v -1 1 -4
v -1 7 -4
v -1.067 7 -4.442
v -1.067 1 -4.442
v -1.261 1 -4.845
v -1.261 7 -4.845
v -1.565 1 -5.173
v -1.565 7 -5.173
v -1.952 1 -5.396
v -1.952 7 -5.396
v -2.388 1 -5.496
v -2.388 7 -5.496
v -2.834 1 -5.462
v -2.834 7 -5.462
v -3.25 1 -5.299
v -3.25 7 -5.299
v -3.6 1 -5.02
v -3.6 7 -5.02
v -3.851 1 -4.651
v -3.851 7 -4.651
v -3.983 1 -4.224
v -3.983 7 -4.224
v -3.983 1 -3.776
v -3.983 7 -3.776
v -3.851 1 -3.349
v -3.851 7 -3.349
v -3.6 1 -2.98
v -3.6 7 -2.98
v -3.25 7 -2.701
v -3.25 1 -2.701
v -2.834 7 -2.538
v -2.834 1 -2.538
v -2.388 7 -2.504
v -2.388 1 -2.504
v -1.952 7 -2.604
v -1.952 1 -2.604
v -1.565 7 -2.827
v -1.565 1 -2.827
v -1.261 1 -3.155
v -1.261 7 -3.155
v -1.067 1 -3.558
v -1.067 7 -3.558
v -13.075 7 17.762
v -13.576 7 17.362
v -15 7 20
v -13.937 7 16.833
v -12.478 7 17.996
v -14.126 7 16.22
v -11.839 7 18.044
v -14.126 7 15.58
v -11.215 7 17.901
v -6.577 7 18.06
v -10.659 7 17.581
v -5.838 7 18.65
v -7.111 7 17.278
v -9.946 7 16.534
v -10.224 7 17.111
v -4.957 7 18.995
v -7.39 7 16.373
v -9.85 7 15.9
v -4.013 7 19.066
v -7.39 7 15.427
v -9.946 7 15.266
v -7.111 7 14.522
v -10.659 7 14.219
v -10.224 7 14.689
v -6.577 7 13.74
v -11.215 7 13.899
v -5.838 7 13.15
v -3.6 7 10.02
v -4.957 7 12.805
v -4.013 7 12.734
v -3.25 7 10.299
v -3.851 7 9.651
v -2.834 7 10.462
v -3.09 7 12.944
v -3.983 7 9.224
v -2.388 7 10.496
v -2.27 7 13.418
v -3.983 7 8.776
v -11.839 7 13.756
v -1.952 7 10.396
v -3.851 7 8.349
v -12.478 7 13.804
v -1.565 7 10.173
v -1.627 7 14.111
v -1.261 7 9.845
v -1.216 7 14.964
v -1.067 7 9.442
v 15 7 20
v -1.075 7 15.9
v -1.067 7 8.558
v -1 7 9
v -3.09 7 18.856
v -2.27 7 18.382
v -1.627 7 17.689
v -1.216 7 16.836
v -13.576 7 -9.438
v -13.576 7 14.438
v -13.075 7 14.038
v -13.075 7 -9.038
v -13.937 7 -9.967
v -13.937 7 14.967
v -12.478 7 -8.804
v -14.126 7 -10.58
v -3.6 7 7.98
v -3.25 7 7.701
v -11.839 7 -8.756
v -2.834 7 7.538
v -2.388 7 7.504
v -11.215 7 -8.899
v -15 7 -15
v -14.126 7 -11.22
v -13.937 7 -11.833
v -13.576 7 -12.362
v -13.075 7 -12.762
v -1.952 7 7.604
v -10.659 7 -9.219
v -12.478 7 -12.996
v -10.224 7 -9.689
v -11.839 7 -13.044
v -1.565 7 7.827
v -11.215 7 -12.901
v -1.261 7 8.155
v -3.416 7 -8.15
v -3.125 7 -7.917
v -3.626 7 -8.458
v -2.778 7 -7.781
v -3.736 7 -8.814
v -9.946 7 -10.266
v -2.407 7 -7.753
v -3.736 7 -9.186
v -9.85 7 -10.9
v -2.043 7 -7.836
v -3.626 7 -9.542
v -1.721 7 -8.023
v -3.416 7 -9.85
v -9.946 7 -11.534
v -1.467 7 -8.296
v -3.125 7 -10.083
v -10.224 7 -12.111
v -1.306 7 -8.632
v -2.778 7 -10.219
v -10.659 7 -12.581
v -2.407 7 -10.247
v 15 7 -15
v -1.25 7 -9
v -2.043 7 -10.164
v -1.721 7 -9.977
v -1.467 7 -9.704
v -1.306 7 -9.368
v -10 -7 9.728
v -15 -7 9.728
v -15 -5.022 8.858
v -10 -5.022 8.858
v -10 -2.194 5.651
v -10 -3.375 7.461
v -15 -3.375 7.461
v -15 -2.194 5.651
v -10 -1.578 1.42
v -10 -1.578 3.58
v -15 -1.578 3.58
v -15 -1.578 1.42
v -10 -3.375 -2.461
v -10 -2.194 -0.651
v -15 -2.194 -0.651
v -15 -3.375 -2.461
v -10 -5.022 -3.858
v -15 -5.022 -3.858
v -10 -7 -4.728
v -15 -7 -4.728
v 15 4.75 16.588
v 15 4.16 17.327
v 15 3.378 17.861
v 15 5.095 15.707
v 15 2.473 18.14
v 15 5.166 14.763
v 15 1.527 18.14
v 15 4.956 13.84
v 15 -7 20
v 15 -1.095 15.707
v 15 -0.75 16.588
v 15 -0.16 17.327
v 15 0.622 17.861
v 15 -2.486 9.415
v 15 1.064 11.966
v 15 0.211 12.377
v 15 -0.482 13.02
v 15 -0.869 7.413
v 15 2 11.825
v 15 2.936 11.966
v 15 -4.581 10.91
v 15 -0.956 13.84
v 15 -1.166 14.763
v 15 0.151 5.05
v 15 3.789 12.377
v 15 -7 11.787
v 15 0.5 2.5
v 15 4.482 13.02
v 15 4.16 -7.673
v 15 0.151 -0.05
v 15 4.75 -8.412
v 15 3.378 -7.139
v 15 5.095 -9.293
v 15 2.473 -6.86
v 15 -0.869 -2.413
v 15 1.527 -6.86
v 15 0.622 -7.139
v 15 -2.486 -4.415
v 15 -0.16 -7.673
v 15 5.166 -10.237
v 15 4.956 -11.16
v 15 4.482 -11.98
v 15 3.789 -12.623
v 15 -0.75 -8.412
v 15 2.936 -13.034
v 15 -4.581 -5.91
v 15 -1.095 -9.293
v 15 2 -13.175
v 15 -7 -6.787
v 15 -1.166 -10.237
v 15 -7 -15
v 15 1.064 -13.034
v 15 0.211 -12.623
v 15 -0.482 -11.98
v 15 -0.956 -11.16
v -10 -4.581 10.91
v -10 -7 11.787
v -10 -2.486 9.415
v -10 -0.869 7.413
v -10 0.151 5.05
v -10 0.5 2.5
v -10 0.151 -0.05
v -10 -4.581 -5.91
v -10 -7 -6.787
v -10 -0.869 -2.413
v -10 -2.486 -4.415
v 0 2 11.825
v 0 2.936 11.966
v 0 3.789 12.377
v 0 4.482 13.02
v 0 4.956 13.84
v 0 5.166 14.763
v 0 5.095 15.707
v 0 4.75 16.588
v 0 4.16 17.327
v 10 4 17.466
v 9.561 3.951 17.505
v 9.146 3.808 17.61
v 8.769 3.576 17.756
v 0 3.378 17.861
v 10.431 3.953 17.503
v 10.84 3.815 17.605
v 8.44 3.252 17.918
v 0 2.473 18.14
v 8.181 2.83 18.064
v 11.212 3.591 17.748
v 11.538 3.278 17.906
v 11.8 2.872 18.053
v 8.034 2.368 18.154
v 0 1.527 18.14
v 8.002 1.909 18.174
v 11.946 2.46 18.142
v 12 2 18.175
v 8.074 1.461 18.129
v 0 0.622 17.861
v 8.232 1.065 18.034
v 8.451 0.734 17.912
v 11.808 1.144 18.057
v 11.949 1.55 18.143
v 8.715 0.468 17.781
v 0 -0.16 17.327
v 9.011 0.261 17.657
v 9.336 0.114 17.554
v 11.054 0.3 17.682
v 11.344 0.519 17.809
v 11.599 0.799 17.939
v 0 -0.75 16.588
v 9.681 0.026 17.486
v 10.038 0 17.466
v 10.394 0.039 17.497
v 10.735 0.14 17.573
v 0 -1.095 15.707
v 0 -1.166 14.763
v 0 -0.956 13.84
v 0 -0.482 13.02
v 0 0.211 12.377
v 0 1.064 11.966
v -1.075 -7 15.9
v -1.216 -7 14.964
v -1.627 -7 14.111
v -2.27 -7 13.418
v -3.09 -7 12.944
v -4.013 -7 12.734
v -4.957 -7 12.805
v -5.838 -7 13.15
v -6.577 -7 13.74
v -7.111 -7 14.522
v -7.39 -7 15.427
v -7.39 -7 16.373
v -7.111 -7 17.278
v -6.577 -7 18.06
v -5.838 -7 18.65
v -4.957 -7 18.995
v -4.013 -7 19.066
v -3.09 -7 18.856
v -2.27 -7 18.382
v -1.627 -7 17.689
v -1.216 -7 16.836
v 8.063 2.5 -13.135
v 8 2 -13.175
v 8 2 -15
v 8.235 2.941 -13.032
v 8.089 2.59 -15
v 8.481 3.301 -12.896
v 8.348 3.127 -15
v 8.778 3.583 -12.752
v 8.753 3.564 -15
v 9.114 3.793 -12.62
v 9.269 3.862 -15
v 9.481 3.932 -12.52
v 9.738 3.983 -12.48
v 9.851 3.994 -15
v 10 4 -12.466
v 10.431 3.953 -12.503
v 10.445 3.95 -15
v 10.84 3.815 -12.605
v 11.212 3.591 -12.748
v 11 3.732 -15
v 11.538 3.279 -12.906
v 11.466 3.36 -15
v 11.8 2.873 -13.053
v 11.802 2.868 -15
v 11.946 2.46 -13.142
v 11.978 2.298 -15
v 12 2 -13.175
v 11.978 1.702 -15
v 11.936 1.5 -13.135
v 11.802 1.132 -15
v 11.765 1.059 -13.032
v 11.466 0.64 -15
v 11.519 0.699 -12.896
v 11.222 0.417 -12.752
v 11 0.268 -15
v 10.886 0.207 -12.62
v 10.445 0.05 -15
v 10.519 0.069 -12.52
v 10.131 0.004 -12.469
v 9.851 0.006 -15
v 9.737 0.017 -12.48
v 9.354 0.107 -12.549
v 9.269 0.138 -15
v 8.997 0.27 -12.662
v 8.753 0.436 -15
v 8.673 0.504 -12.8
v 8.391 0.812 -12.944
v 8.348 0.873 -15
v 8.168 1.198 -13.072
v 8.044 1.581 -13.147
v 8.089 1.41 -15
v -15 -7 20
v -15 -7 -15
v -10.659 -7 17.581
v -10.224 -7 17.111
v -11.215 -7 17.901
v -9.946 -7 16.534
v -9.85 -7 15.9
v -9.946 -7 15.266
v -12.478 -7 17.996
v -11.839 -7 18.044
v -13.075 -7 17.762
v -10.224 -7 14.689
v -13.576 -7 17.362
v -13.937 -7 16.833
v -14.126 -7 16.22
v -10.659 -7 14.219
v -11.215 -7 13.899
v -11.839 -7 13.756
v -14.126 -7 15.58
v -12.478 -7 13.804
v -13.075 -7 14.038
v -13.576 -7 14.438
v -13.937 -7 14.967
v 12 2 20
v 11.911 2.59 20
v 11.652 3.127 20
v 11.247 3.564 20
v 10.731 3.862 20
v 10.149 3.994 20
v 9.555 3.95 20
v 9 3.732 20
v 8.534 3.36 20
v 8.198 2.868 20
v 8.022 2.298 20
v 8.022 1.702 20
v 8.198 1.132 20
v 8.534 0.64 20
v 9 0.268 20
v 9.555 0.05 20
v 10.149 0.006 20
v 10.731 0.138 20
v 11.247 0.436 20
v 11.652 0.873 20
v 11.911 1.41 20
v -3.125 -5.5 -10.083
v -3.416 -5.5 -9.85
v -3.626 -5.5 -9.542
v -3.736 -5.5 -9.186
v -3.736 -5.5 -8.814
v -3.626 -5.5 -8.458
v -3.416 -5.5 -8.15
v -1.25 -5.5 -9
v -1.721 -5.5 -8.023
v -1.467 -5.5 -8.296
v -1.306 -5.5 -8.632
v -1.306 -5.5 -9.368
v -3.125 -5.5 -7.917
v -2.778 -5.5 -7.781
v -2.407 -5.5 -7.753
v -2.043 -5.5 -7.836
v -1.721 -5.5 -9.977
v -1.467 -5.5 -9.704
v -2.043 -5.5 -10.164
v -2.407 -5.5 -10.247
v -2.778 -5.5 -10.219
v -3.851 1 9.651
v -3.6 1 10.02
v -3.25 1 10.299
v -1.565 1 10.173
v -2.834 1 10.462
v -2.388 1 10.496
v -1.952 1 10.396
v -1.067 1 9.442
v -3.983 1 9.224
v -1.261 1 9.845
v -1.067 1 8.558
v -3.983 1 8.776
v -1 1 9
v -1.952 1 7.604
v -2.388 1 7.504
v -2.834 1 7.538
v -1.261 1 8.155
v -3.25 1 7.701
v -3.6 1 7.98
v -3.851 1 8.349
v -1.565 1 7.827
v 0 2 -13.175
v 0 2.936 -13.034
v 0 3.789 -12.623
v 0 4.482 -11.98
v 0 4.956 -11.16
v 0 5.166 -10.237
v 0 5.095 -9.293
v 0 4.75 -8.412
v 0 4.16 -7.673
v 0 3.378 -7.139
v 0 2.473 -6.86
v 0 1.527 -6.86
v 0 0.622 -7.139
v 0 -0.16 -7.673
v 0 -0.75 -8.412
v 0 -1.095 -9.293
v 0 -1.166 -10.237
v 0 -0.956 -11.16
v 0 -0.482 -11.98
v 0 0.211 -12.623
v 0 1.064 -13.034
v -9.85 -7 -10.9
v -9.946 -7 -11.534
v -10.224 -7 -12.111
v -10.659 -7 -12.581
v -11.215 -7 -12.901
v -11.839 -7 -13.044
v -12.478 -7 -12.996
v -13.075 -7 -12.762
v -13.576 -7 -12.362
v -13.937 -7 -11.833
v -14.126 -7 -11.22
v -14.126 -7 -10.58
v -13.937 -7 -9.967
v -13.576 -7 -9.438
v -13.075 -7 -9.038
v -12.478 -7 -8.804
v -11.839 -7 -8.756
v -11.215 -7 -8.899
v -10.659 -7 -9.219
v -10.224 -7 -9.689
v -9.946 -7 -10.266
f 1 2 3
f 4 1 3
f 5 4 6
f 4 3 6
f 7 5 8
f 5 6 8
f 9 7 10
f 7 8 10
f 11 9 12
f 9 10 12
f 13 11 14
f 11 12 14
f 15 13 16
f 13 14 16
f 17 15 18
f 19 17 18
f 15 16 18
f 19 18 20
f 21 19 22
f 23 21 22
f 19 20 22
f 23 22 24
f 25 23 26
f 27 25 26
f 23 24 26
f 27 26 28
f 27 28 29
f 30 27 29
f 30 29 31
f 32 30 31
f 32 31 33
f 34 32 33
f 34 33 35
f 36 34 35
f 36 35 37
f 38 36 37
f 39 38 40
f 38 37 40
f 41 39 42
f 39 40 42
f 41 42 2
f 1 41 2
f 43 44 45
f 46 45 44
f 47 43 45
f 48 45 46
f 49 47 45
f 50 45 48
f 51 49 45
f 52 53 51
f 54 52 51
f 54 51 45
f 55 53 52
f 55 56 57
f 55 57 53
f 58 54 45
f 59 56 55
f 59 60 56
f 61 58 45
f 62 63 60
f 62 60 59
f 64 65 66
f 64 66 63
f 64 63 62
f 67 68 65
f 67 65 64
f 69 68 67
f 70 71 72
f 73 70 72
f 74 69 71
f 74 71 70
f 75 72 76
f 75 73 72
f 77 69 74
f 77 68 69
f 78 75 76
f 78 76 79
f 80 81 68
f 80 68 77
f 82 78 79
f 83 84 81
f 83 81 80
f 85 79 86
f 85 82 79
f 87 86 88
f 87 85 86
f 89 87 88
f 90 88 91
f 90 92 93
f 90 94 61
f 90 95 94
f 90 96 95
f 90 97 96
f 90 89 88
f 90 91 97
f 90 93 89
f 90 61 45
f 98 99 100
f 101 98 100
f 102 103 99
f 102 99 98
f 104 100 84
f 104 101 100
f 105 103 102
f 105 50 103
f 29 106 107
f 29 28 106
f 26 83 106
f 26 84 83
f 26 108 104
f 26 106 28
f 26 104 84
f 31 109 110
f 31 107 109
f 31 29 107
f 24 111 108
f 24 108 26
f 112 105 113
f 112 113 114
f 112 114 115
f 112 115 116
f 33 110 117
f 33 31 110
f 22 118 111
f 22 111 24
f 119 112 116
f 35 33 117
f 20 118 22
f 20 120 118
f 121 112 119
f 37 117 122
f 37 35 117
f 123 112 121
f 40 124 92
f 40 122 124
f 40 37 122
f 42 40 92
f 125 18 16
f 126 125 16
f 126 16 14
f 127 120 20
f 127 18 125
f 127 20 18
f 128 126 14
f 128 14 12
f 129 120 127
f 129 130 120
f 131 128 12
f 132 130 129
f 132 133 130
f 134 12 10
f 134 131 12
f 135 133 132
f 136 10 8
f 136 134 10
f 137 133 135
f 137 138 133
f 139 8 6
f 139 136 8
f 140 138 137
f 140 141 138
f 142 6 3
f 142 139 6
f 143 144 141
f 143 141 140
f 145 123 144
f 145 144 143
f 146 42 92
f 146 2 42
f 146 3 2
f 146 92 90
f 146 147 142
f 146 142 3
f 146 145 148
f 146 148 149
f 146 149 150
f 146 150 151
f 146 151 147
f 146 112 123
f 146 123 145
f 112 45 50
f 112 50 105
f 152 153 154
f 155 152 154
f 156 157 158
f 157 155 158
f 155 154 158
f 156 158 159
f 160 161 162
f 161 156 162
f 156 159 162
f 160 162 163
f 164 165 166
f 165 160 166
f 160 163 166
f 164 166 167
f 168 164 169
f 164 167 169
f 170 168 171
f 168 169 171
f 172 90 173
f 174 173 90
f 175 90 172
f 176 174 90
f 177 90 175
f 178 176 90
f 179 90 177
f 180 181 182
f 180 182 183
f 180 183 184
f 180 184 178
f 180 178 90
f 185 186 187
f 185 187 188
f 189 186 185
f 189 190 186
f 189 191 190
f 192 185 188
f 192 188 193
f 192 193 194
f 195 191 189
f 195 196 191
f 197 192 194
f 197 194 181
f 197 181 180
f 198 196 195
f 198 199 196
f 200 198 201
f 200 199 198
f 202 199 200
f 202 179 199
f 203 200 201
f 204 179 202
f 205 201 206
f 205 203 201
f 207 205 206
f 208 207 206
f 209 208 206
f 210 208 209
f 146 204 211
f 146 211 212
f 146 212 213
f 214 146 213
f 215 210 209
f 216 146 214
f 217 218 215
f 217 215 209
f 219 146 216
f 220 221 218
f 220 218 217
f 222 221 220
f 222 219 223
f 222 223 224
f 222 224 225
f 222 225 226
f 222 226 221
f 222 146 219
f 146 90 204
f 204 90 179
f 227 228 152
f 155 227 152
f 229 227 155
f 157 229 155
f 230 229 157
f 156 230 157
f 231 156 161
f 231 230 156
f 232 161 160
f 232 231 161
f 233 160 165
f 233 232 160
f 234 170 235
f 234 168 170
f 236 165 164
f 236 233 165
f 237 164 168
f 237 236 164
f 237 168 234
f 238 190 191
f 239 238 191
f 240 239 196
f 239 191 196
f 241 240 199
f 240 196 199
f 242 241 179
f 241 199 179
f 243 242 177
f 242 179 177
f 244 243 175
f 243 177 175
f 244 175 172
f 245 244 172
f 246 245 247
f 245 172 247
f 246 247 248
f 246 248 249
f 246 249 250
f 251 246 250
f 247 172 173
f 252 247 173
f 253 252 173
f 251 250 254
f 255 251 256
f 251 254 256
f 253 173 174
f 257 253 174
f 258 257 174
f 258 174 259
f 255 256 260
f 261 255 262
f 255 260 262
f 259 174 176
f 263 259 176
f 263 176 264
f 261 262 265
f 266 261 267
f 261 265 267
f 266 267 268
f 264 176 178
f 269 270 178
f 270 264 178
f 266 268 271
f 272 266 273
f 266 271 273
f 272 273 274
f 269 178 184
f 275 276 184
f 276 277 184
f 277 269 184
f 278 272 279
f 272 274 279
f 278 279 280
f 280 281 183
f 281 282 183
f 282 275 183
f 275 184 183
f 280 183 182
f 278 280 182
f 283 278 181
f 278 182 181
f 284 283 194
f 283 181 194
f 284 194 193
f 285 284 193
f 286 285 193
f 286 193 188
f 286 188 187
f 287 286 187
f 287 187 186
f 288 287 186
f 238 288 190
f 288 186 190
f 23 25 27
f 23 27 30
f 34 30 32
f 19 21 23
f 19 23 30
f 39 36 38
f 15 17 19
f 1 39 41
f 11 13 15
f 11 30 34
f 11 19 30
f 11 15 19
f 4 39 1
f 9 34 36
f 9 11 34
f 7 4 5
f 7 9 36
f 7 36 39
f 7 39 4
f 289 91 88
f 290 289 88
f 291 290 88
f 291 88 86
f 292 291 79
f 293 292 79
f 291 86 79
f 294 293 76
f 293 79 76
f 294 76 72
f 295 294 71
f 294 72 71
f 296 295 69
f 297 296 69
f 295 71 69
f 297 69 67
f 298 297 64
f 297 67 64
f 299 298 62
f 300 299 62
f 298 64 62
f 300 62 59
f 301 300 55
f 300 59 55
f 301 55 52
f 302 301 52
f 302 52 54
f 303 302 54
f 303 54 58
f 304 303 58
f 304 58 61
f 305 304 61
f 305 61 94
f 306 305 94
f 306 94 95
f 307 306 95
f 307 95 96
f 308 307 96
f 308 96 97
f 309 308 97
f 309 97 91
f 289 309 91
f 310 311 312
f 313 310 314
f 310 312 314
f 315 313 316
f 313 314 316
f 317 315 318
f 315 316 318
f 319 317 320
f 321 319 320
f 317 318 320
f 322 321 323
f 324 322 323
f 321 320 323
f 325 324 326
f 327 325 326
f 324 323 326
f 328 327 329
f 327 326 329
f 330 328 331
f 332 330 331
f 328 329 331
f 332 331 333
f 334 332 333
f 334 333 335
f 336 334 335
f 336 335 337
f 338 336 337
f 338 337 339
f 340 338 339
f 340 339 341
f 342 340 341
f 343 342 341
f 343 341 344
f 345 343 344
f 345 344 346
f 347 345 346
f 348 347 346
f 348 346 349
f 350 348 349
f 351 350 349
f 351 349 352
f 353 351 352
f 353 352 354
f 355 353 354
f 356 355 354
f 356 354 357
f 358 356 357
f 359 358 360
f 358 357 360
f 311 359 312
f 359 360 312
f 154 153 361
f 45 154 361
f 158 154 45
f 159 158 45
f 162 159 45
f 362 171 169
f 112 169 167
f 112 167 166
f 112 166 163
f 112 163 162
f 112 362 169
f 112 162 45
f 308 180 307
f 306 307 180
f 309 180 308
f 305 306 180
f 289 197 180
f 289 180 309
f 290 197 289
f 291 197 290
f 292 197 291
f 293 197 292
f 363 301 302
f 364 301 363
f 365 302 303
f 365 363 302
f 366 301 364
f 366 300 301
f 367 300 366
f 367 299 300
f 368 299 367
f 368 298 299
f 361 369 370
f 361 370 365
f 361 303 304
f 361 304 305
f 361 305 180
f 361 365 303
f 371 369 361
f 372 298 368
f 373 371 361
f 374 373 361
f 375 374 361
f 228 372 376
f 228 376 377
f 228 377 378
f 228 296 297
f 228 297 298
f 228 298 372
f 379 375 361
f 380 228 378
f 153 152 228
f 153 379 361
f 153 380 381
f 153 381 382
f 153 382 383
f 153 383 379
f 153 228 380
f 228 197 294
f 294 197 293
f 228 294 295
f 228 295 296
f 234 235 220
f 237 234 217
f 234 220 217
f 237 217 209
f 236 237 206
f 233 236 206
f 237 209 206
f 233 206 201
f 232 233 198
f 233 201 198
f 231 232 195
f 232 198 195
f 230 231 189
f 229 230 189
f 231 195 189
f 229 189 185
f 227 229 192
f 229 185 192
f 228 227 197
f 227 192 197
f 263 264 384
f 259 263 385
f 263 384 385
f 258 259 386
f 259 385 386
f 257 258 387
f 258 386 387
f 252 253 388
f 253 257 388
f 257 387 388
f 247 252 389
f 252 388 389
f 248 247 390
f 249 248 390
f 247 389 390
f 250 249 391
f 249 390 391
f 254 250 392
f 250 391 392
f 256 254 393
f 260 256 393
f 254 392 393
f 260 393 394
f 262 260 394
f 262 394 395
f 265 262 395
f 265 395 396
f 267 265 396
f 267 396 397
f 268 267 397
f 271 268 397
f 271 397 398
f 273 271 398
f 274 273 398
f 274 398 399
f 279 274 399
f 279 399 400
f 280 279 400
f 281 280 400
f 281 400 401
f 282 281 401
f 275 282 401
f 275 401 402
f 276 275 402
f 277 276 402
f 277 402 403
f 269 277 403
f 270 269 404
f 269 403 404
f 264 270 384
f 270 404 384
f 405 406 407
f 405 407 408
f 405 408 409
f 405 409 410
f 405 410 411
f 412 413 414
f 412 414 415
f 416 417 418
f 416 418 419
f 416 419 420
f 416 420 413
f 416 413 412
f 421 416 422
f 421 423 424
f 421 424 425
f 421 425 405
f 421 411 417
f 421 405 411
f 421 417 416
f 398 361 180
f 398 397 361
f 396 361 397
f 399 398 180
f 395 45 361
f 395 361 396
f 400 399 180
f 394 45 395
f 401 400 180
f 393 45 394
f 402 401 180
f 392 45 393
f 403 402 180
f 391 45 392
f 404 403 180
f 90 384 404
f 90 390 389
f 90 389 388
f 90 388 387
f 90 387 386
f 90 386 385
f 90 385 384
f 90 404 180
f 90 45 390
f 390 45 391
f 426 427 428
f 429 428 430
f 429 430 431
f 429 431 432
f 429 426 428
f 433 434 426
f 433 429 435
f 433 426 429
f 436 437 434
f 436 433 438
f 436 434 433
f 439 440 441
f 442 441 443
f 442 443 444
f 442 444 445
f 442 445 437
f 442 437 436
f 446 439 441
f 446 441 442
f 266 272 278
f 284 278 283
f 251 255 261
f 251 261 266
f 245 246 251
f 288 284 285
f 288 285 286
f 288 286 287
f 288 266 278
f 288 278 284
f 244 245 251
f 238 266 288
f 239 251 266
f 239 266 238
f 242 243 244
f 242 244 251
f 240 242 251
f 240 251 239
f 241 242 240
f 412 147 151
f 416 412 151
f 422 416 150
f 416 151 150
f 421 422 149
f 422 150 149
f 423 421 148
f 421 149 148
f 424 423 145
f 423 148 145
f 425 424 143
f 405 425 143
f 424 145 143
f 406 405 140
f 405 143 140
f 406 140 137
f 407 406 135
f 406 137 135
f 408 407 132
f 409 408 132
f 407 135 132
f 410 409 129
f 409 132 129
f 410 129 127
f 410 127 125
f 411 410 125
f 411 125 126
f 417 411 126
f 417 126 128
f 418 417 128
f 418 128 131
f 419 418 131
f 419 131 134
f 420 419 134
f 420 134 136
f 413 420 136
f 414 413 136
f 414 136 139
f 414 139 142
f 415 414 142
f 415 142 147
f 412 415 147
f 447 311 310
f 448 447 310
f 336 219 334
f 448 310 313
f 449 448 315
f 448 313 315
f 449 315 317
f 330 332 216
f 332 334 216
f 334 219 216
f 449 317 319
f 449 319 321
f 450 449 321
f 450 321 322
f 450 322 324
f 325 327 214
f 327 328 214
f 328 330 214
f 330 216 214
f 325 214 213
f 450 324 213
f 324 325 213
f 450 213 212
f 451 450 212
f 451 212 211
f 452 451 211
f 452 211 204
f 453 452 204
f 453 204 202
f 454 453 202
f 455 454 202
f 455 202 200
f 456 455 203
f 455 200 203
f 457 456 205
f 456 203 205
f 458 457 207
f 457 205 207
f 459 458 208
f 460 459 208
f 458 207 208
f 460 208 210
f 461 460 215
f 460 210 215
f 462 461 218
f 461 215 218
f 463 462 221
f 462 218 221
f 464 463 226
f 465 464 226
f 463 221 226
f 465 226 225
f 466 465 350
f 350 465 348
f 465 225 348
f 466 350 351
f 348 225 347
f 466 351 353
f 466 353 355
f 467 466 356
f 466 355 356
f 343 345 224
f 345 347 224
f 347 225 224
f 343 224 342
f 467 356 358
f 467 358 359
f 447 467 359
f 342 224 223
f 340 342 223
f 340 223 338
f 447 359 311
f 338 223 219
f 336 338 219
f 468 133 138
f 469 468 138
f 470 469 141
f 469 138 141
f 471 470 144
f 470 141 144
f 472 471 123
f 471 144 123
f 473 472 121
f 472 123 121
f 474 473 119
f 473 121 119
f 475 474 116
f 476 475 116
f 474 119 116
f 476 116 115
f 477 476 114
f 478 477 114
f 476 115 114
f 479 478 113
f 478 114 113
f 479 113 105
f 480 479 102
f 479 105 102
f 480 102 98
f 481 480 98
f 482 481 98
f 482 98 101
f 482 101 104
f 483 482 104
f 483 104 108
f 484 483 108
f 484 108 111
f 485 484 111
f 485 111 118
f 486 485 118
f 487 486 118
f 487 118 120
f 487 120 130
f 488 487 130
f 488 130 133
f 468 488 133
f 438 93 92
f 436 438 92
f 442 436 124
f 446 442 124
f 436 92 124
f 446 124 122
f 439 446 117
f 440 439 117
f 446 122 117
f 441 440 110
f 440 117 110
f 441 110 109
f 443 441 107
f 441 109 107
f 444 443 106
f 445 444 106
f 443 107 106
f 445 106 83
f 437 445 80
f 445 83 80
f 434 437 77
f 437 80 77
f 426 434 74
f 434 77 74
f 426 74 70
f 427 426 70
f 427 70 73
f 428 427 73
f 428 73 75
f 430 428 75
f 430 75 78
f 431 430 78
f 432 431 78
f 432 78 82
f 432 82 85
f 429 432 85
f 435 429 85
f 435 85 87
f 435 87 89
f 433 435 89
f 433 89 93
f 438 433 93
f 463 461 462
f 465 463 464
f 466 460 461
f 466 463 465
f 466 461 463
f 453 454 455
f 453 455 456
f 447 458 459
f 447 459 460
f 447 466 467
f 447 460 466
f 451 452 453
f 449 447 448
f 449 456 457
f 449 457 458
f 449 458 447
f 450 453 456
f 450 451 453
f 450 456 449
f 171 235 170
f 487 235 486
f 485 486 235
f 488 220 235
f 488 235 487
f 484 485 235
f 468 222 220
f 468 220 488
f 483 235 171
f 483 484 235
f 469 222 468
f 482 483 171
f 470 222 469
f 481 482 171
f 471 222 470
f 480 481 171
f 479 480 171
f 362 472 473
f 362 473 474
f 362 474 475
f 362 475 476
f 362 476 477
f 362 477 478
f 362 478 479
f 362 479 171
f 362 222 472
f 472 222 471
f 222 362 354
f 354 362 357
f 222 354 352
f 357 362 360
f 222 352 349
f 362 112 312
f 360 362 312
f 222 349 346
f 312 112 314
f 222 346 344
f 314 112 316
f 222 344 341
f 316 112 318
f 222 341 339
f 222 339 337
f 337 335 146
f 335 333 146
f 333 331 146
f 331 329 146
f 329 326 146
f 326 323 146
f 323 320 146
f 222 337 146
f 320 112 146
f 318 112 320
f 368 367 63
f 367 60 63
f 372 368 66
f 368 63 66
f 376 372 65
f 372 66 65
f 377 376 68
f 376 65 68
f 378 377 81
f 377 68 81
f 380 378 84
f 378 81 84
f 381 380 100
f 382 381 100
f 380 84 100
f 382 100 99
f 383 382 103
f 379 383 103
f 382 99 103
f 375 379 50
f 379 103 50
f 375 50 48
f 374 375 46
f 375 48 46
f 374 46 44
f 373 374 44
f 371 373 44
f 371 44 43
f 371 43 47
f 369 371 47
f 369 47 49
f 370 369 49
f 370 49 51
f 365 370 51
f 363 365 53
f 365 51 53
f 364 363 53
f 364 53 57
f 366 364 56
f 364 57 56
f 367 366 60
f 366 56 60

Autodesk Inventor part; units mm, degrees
ref_plane "YZ Plane" through (0, 0, 0) normal (1, 0, 0) x (0, 1, 0)
ref_plane "XZ Plane" through (0, 0, 0) normal (0, 1, 0) x (-1, 0, 0)
ref_plane "XY Plane" through (0, 0, 0) normal (0, 0, 1) x (1, 0, 0)
sketch "Sketch1" plane through (0, 0, 0) normal (0, 0, 1) x (1, 0, 0)
  line L0 (15, -7) -> (-15, -7)
  line L1 (-15, -7) -> (-15, 7)
  line L2 (-15, 7) -> (15, 7)
  line L3 (15, 7) -> (15, -7)
  line L4 (15, -7) -> (-15, 7) construction
  line L5 (-15, -7) -> (15, 7) construction
  point P0 (0, 0)
  dimension "d0" = 30
  dimension "d1" = 14
extrude "Extrusion1" add sketch "Sketch1" along normal blind 35
sketch "Sketch3" plane through (15, -7, 0) normal (1, 0, 0) x (0, 0, -1)
  line L0 (0, 0) -> (-35, 0) projected
  line L1 (-17.5, 0) -> (-17.5, -2)
  arc A0 (-8.2129, 0) -> (-26.7871, 0) centre (-17.5, -2) ccw
  point P0 (0, 7)
  dimension "d4" = 2
  dimension "d5" = 19
extrude "Extrusion2" cut sketch "Sketch3" against normal blind 25
sketch "Sketch5" plane through (-15, 7, 0) normal (0, 1, 0) x (1, 0, 0)
  line L0 (30, 0) -> (0, 0) projected
  line L1 (30, -35) -> (0, -35) projected
  line L2 (0, -35) -> (0, -30.9)
  line L3 (0, 0) -> (0, -35) projected
  line L4 (0, -30.9) -> (2.75, -30.9)
  circle A0 centre (2.75, -30.9) radius 2
  line L5 (0, 0) -> (0, -4.1)
  line L6 (0, -4.1) -> (2.75, -4.1)
  circle A1 centre (2.75, -4.1) radius 2
  line L7 (2.75, -30.9) -> (10.75, -30.9)
  circle A2 centre (10.75, -30.9) radius 3.175
  point P0 (15, 0)
  dimension "d11" = 4.1
  dimension "d12" = 2.75
  dimension "d13" = 4
  dimension "d14" = 4.1
  dimension "d15" = 2.75
  dimension "d16" = 4
  dimension "d17" = 8
  dimension "d18" = 6.35
extrude "Extrusion3" cut sketch "Sketch5" against normal blind 100 contours A2
sketch "Sketch6" plane through (-15, 7, 0) normal (0, 1, 0) x (1, 0, 0)
  point P0 (15, 0)
sketch "Sketch7" plane through (15, -7, 0) normal (1, 0, 0) x (0, 0, -1)
  line L0 (0, 14) -> (-35, 14) projected
  line L1 (-35, 14) -> (-30, 14)
  line L2 (-30, 14) -> (-30, 9)
  line L3 (0, 14) -> (0, 0) projected
  line L4 (0, 14) -> (-5, 14)
  line L5 (-5, 14) -> (-5, 9)
  circle A0 centre (-30, 9) radius 3.175
  circle A1 centre (-5, 9) radius 3.175
  point P0 (0, 7)
  dimension "d21" = 5
  dimension "d22" = 5
  dimension "d23" = 5
  dimension "d24" = 5
  dimension "d25" = 6.35
  dimension "d26" = 6.35
extrude "Extrusion4" cut sketch "Sketch7" against normal blind 15
move or copy body "Move Body1" bodies to move or copy 1 copy no translate (-20, 0, 0)
move or copy body "Move Body2" bodies to move or copy 1 copy no translate (-5, 0, 0)
sketch "Sketch8" plane through (0, 0, 0) normal (1, 0, 0) x (0, 1, 0)
  point P0 (0, 0)
sketch "Sketch9" plane through (-40, 7, 0) normal (0, 1, 0) x (1, 0, 0)
  line L0 (30, -35) -> (0, -35) projected
  line L1 (0, -35) -> (0, -30.9)
  line L2 (0, 0) -> (0, -35) projected
  line L3 (0, -30.9) -> (3, -30.9)
  circle A0 centre (3, -30.9) radius 2.15
  line L4 (0, 0) -> (0, -4.1)
  line L5 (0, -4.1) -> (3, -4.1)
  circle A1 centre (3, -4.1) radius 2.15
  point P0 (40, 0)
  dimension "d35" = 4.1
  dimension "d36" = 3
  dimension "d37" = 4.3
  dimension "d38" = 4.1
  dimension "d39" = 4.3
  dimension "d40" = 3
extrude "Extrusion5" cut sketch "Sketch9" against normal blind 14
sketch "Sketch14" plane through (-40, 7, 35) normal (0, 0, 1) x (1, 0, 0)
  line L0 (30, 0) -> (0, 0) projected
  line L1 (30, 0) -> (25, 0)
  line L2 (25, 0) -> (25, -5)
  circle A0 centre (25, -5) radius 2
  point P0 (40, -7)
  dimension "d47" = 5
  dimension "d48" = 5
  dimension "d49" = 4
extrude "Extrusion6" cut sketch "Sketch14" against normal blind 3
sketch "Sketch15" plane through (-10, 7, 0) normal (0, 0, -1) x (-1, 0, 0)
  line L0 (0, -14) -> (0, 0) projected
  line L1 (0, 0) -> (5, 0)
  line L2 (0, 0) -> (30, 0) projected
  line L3 (5, 0) -> (5, -5)
  circle A0 centre (5, -5) radius 2
  point P0 (-10, -7)
  dimension "d52" = 5
  dimension "d53" = 5
  dimension "d54" = 4
extrude "Extrusion7" cut sketch "Sketch15" against normal blind 4
thread "Thread3" size "M4x0.7" class "6H" standard "ANSI Metric M Profile" full length
thread "Thread4" size "M4x0.7" class "6H" standard "ANSI Metric M Profile" full length
sketch "Sketch16" plane through (-40, -7, 0) normal (-1, 0, 0) x (0, 0, 1)
  line L0 (0, 14) -> (35, 14) projected
  line L1 (0, 14) -> (17.5, 14)
  line L2 (17.5, 14) -> (17.5, -2)
  circle A0 centre (17.5, -2) radius 7.5
  point P0 (0, 7)
  dimension "d61" = 16
  dimension "d62" = 15
extrude "Extrusion8" cut sketch "Sketch16" against normal blind 15
move or copy body "Move Body3" bodies to move or copy 1 copy no translate (25, 0, 0)
move or copy body "Move Body4" bodies to move or copy 1 copy no translate (10, 0, -15)
move or copy body "Move Body5" bodies to move or copy 1 copy no translate (-10, 0, 0)
sketch "Sketch17" plane through (15, -7, -15) normal (1, 0, 0) x (0, 0, -1)
  point P0 (-15, 7)
sketch "Sketch19" plane through (-15, 7, -15) normal (0, 1, 0) x (1, 0, 0)
  line L0 (30, 0) -> (0, 0) projected
  line L1 (0, 0) -> (0, -6)
  line L2 (0, 0) -> (6, 0) construction
  line L3 (0, -6) -> (12.5, -6)
  circle A0 centre (12.5, -6) radius 1.25
  line L4 (12.5, -6) -> (12.5, -8.5)
  line L5 (12.5, -6) -> (15, -6) construction
  point P0 (15, -15)
  dimension "d74" = 6
  dimension "d75" = 90
  dimension "d76" = 12.5
  dimension "d77" = 90
  dimension "d78" = 2.5
  dimension "d84" = 2.5
  dimension "d85" = 90
extrude "Extrusion9" cut sketch "Sketch19" against normal blind 12.5
sketch "Sketch20" plane through (-15, 7, -15) normal (0, 1, 0) x (1, 0, 0)
  circle A0 centre (12.5, -6) radius 1.25 projected
  line L0 (12.5, -6) -> (12.5, -11)
  circle A1 centre (12.5, -11) radius 1.5
  line L1 (30, 0) -> (0, 0) projected
  line L2 (12.5, -11) -> (25.5, -11) construction
  line L3 (0, 0) -> (0, -35) projected
  line L4 (0, -17.5) -> (30, -17.5)
  line L5 (30, -8.2129) -> (30, -26.7871) projected
  circle A2 centre (12.5, -24) radius 1.5
  point P0 (15, -15)
  dimension "d86" = 5
  dimension "d87" = 3
extrude "Extrusion10" cut sketch "Sketch20" against normal blind 6 contours A1 | A2
thread "Thread5" size "M3x0.5" class "6H" standard "ANSI Metric M Profile" full length
thread "Thread6" size "M3x0.5" class "6H" standard "ANSI Metric M Profile" full length
equation "\"d55\" = d54"
properties part number "Rb oven housing top-back" material "Copper"
